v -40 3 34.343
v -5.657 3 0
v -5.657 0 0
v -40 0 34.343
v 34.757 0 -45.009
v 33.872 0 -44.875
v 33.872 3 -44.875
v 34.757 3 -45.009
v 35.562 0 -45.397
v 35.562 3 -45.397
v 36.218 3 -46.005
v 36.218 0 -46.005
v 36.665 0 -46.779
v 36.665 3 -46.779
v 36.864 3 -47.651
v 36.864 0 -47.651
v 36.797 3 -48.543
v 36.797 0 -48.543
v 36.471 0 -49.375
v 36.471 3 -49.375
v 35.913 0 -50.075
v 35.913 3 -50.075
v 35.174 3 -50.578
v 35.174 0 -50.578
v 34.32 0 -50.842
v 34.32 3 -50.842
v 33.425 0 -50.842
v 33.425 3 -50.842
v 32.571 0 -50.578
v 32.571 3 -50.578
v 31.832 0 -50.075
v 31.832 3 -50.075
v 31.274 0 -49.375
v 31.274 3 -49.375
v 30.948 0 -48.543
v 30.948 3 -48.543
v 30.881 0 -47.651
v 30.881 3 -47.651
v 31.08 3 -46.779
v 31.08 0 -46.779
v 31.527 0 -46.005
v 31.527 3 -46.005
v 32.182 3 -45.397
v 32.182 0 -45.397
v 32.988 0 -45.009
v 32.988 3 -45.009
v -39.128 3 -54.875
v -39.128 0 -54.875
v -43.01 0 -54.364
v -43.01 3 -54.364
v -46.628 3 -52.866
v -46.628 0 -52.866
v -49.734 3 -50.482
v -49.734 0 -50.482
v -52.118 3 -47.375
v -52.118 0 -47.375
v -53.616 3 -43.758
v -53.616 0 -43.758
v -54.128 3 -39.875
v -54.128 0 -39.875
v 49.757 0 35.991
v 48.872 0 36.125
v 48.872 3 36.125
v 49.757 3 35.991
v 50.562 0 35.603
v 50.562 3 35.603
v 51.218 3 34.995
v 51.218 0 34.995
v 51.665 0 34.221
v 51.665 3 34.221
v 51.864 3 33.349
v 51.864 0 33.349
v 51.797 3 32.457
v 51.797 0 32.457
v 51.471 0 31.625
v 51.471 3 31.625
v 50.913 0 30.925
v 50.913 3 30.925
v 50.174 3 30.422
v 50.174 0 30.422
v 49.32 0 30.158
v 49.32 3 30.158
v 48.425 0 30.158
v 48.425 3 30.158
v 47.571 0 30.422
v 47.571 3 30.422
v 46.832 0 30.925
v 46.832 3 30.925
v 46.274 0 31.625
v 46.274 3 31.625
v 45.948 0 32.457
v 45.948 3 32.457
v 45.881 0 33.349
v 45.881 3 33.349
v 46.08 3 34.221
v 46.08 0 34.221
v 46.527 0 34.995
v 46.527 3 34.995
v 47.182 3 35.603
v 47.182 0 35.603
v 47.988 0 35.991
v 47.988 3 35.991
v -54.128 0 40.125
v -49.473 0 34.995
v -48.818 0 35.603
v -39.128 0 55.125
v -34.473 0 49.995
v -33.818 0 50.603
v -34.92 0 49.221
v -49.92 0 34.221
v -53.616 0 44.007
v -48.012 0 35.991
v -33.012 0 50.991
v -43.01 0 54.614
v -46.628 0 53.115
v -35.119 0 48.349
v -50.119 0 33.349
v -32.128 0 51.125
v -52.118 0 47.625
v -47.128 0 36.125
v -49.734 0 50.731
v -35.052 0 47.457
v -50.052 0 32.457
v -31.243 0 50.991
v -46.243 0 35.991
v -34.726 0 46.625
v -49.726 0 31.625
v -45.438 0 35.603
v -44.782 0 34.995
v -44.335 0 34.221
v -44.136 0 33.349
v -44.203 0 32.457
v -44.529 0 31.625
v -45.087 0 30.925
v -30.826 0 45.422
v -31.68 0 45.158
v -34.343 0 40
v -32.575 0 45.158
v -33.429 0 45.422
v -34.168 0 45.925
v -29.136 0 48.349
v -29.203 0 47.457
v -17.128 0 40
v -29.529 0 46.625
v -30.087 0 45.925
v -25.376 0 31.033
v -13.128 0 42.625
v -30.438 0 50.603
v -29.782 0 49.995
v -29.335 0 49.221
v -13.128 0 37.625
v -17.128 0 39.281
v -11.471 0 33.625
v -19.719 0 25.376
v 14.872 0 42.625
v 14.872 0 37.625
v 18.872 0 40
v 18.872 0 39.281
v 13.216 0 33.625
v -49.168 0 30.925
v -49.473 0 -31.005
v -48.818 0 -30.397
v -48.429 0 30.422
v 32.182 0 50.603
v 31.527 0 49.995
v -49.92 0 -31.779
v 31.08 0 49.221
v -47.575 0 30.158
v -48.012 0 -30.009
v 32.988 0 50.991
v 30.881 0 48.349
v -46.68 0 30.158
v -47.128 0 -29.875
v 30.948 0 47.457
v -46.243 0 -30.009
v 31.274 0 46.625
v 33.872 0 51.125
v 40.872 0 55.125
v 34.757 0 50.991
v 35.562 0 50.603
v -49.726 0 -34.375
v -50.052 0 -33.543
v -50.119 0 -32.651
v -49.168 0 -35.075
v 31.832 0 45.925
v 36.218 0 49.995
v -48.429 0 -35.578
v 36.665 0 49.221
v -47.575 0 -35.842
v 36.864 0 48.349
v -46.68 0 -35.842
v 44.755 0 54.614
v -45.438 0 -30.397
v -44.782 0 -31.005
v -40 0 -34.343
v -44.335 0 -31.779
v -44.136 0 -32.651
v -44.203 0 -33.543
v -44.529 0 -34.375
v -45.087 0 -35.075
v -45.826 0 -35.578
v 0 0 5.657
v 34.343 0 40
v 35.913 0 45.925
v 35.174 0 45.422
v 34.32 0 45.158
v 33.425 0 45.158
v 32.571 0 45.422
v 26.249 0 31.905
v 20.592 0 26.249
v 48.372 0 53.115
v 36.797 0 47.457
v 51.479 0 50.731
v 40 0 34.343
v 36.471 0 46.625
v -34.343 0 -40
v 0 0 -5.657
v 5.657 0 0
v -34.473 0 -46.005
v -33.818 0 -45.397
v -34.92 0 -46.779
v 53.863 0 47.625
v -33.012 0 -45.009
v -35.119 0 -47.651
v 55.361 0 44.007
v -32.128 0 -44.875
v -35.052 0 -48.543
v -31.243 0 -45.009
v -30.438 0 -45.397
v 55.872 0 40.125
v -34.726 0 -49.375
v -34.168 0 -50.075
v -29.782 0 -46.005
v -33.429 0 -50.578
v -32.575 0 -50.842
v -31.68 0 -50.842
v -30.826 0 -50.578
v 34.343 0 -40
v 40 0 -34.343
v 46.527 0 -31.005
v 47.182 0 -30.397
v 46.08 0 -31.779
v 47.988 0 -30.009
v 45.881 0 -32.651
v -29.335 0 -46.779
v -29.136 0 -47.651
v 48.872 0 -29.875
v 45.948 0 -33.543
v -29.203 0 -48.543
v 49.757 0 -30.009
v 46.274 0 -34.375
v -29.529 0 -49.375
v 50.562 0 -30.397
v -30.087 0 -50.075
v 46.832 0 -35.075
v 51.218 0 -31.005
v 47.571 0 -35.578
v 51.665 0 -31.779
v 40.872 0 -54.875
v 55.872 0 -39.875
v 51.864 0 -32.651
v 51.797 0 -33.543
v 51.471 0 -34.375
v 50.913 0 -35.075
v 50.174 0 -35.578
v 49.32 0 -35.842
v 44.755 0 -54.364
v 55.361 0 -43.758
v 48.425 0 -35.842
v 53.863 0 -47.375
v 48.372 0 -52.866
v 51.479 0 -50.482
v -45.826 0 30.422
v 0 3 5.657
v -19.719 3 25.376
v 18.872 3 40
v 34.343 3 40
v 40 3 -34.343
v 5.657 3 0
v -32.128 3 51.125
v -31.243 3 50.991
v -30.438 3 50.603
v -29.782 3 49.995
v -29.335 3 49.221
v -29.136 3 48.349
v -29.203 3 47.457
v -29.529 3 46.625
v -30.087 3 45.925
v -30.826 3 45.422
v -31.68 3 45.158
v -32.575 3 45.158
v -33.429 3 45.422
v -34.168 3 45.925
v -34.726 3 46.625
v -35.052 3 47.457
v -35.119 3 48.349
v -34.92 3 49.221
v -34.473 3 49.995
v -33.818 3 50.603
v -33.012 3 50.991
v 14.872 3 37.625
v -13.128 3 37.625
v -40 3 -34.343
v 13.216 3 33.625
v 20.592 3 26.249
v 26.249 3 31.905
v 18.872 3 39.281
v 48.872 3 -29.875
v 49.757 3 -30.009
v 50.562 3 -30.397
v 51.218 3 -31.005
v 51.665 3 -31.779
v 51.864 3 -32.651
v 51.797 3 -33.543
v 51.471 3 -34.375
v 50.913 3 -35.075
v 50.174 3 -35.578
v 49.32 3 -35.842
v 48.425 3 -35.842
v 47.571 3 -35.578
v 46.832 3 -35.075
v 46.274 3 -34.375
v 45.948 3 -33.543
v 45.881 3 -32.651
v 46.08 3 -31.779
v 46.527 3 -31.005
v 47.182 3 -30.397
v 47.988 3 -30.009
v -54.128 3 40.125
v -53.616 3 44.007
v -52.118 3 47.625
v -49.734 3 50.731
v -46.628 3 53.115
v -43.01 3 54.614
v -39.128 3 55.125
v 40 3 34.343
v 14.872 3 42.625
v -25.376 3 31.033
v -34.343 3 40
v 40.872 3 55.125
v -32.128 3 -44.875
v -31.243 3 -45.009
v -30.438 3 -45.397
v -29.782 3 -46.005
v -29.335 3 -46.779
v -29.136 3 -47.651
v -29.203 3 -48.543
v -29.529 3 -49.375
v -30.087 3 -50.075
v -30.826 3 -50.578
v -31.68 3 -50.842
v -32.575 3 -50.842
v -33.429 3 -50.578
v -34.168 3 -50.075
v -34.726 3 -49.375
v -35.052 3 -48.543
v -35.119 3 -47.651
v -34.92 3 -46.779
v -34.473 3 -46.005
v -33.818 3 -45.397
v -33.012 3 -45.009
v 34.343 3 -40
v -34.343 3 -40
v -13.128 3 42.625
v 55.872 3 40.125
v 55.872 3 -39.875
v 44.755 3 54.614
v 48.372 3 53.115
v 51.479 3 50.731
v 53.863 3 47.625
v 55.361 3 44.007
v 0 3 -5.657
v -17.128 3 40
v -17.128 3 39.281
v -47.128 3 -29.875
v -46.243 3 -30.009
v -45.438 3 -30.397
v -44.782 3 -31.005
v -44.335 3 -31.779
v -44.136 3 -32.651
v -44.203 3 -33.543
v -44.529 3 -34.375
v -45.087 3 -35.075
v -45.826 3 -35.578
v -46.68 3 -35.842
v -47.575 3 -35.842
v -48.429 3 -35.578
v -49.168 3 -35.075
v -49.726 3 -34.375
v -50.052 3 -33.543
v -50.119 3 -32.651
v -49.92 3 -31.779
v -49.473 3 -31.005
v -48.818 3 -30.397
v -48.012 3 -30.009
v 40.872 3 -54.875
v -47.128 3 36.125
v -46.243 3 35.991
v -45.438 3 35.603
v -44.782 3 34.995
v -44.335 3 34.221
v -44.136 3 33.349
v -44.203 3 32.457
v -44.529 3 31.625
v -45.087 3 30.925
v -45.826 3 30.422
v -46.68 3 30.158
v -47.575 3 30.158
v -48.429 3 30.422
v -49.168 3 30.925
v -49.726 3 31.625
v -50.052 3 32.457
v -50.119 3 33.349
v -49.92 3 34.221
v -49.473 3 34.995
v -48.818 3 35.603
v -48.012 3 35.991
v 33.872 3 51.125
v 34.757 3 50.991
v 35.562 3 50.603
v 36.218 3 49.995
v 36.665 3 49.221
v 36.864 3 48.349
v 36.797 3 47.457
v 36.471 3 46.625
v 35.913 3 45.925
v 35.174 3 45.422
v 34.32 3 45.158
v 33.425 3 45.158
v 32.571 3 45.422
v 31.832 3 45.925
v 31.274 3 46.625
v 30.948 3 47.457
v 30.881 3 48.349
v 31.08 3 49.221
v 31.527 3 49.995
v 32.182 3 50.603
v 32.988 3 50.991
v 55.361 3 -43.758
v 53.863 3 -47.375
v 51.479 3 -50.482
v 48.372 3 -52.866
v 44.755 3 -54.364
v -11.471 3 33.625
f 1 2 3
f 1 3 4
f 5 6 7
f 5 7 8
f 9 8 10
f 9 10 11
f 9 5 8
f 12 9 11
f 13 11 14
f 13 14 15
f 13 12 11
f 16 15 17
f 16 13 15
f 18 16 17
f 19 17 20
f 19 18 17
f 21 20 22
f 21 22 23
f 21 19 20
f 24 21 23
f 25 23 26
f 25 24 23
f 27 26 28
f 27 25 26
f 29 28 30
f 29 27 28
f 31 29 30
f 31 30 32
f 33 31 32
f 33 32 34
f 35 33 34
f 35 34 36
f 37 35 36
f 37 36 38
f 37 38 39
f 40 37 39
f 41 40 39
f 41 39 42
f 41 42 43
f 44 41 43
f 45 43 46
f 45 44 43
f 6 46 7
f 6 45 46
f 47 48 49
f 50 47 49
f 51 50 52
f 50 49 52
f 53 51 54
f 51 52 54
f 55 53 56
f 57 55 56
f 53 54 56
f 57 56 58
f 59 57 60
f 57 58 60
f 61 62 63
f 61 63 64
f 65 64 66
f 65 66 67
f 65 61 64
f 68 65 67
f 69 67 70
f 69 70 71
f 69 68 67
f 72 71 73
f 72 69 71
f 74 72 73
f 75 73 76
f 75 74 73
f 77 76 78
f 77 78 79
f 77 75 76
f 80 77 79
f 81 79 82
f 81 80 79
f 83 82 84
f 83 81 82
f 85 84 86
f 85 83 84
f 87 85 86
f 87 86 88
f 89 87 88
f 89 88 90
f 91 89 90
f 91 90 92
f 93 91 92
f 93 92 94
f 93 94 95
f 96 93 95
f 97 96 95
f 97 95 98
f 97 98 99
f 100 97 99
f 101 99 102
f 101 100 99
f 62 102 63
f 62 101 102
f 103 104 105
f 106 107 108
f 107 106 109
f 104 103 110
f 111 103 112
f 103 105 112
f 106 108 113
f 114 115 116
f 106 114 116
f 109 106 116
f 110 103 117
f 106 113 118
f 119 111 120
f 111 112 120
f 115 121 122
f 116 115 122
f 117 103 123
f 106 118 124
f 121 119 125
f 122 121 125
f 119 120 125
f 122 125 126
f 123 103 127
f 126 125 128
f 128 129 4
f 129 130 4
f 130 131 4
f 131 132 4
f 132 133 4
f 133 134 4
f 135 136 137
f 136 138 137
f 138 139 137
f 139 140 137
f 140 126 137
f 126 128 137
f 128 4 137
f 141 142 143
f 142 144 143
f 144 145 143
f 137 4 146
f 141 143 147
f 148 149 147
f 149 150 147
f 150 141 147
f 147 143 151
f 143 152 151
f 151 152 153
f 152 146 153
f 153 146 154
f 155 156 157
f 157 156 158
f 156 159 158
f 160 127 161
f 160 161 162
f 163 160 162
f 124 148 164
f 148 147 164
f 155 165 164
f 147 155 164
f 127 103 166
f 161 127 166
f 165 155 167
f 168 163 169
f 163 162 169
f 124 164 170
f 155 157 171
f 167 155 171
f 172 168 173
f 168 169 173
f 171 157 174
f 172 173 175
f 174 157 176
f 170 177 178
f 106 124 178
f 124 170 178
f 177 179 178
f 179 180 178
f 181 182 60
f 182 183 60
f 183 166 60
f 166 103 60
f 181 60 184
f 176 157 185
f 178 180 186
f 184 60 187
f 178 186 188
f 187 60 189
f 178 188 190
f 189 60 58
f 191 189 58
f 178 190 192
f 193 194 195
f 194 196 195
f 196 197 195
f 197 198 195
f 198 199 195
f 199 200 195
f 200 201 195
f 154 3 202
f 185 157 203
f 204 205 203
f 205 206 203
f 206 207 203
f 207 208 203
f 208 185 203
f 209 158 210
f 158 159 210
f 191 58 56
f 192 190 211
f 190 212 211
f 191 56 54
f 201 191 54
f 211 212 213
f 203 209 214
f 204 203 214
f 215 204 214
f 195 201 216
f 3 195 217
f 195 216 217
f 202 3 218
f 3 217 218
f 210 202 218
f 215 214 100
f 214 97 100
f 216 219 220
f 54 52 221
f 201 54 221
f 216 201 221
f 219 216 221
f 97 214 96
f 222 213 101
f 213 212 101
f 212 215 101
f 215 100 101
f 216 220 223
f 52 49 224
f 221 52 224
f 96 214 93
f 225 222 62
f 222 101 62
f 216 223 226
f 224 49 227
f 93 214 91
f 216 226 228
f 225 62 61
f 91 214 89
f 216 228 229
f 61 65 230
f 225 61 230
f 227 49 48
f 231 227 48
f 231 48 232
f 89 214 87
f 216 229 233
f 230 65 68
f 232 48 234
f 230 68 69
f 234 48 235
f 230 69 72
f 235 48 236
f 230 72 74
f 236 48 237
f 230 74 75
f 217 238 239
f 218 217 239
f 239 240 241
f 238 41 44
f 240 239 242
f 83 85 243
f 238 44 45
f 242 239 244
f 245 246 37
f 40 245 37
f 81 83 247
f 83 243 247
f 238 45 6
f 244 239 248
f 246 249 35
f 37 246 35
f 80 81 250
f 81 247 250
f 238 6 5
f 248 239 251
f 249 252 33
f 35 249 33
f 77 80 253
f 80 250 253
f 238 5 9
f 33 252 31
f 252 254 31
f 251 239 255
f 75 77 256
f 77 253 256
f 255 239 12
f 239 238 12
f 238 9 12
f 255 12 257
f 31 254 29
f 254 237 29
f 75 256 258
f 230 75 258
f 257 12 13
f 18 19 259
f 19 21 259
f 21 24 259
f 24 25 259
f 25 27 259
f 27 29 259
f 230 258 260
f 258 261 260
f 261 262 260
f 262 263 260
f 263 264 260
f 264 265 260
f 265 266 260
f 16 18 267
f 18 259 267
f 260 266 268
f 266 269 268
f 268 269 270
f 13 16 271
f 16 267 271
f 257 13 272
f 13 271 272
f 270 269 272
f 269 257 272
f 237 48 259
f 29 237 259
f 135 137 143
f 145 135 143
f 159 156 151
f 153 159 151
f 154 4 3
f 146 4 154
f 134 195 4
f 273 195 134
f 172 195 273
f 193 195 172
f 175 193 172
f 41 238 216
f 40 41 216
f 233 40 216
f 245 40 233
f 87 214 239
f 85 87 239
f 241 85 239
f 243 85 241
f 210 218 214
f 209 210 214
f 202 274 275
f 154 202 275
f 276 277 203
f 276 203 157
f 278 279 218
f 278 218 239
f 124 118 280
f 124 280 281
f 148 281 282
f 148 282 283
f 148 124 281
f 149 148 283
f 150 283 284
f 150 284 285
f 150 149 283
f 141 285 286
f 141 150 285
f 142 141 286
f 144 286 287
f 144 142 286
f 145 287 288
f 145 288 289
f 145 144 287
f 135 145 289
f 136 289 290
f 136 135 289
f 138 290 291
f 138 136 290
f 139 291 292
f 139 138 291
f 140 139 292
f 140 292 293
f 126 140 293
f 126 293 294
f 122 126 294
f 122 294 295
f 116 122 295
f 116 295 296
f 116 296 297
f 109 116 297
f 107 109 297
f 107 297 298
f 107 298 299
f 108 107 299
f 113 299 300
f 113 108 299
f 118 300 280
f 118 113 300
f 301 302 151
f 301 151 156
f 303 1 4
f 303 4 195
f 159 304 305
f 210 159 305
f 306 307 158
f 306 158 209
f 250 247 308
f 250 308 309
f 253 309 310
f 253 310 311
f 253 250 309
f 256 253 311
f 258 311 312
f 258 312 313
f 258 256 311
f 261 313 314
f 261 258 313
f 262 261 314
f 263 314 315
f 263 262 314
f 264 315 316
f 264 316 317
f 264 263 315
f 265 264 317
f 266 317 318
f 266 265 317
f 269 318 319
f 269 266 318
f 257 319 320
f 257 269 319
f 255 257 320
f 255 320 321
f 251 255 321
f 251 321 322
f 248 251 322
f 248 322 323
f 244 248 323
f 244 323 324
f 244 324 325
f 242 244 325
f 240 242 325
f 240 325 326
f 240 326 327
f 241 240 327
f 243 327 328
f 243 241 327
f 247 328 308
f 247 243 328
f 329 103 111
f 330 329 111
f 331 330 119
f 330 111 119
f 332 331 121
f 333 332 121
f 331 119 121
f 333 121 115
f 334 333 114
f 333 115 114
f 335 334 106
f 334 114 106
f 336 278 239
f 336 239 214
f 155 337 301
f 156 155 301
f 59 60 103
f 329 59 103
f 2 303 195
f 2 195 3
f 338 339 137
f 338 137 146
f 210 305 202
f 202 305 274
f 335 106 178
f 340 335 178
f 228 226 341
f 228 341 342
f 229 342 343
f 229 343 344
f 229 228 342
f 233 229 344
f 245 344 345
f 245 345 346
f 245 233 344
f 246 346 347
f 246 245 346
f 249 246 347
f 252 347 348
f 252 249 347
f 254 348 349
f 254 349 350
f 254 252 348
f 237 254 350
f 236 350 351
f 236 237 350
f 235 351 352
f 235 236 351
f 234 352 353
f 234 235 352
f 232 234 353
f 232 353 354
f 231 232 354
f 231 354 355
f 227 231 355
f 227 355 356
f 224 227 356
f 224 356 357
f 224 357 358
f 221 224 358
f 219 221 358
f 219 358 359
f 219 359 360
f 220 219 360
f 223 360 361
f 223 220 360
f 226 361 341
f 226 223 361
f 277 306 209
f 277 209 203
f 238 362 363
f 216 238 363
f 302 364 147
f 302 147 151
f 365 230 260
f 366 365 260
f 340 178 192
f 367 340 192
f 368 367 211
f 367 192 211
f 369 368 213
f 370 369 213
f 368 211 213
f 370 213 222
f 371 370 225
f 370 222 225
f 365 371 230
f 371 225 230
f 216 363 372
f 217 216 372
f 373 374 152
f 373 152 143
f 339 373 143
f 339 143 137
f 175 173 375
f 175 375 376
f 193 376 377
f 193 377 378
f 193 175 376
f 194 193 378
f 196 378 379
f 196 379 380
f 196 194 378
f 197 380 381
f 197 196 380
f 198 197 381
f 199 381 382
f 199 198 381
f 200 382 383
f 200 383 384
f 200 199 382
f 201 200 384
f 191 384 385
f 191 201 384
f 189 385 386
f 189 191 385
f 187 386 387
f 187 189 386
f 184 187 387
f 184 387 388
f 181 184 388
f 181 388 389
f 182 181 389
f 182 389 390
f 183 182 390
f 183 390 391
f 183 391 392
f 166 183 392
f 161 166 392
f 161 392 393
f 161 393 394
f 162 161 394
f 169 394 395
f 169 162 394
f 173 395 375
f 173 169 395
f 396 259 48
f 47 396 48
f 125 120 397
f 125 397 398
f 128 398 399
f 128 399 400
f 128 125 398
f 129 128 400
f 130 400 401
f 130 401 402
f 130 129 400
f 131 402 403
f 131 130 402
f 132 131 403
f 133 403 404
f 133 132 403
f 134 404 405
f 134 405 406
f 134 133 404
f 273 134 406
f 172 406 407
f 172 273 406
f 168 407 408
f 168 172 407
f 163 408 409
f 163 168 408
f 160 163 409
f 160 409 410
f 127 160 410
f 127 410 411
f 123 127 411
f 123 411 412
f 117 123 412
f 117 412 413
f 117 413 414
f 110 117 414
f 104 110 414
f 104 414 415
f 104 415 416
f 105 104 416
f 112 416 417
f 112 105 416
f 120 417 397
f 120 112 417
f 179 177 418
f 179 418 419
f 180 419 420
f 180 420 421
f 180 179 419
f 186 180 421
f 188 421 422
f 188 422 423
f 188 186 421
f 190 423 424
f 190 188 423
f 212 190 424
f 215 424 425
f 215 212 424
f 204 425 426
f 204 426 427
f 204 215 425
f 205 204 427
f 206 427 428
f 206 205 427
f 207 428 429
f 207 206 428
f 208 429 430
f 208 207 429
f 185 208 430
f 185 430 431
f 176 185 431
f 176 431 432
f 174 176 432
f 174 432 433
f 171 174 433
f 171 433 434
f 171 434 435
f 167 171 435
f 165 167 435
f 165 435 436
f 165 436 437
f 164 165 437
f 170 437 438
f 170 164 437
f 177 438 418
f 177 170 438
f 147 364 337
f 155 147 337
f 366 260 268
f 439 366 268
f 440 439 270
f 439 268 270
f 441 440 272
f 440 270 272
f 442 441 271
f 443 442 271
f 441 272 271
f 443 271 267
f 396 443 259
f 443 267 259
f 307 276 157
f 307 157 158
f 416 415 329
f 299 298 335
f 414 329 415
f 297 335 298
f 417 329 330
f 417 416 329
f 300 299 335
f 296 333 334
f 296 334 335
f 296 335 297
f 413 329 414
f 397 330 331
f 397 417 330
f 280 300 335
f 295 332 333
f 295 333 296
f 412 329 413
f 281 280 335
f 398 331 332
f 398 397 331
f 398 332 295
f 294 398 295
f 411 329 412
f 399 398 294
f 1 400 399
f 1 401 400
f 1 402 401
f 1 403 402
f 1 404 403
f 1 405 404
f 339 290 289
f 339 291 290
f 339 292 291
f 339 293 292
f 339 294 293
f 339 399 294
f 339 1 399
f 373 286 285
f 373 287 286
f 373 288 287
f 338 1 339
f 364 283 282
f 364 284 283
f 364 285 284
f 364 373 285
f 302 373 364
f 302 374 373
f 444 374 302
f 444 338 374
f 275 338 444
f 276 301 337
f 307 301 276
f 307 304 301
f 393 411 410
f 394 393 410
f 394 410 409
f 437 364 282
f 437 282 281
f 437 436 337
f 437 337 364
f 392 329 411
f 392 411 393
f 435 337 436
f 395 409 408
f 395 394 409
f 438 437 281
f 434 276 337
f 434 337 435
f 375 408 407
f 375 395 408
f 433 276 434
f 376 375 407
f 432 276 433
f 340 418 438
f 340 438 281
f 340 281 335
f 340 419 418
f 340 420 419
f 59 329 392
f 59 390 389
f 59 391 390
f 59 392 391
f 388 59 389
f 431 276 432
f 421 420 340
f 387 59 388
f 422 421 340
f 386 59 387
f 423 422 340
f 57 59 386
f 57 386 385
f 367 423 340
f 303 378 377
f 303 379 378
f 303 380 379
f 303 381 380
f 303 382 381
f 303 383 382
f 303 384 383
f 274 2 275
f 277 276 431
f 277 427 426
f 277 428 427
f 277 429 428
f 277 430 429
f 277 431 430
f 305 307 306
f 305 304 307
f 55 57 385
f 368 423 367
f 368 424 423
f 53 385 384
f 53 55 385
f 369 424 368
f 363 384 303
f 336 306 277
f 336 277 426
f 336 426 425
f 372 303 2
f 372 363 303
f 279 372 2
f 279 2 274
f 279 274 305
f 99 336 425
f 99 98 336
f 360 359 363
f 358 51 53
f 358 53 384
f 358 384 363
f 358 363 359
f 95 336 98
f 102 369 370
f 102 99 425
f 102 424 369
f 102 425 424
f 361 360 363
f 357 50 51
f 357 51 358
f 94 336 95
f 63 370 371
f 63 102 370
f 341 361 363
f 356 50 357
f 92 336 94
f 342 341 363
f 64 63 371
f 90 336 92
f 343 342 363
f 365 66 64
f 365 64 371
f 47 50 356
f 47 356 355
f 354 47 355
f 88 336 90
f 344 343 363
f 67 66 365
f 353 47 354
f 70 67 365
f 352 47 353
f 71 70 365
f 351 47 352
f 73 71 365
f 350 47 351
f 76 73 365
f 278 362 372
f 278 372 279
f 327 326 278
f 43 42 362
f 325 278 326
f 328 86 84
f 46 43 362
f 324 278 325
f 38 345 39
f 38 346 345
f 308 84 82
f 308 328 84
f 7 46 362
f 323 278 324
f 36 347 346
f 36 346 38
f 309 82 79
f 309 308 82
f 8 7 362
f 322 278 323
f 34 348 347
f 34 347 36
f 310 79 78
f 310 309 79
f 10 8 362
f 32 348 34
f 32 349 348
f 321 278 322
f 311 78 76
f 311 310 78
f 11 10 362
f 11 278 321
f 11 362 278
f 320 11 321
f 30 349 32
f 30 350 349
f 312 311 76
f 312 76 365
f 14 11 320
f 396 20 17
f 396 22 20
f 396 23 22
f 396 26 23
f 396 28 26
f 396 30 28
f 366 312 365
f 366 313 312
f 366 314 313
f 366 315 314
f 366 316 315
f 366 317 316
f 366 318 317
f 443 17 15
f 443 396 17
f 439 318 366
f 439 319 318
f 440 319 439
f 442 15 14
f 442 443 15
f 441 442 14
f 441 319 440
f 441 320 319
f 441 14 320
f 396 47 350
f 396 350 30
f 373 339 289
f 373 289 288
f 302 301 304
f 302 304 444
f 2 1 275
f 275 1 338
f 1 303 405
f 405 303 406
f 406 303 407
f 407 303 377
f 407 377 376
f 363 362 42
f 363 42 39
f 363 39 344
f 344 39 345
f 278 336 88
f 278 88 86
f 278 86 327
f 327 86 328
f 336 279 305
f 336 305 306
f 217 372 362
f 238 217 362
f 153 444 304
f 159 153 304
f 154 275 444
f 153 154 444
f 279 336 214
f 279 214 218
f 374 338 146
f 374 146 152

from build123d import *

# Parameters (mm, degrees)
SKETCH1_R           = 3
BOSS_EXTRUDE1_DEPTH = 3
SKETCH2_W           = 28
SKETCH2_H           = 5
CUT_EXTRUDE1_DEPTH  = 79.545892535
CUT_EXTRUDE2_DEPTH  = 79.545892535


with BuildPart() as part:
    # Sketch1 → Boss-Extrude1 (new body)
    with BuildSketch(Plane(origin=(0, 0, 0), x_dir=(1, 0, 0), z_dir=(0, 1, 0))):
        with BuildLine():
            Line((55.872458647, -40.12463695), (55.872458647, 39.87536305))
            ThreePointArc((55.872458647, 39.87536305), (51.479060365, 50.481964768), (40.872458647, 54.87536305))
            Line((40.872458647, 54.87536305), (-39.127541353, 54.87536305))
            ThreePointArc((-39.127541353, 54.87536305), (-49.734143071, 50.481964768), (-54.127541353, 39.87536305))
            Line((-54.127541353, 39.87536305), (-54.127541353, -40.12463695))
            ThreePointArc((-54.127541353, -40.12463695), (-49.734143071, -50.731238667), (-39.127541353, -55.12463695))
            Line((-39.127541353, -55.12463695), (40.872458647, -55.12463695))
            ThreePointArc((40.872458647, -55.12463695), (51.479060365, -50.731238667), (55.872458647, -40.12463695))
        make_face()
        with Locations(Location((48.872458647, 32.87536305, 0), (0, 0, 270))):
            Circle(SKETCH1_R, mode=Mode.SUBTRACT)
        with Locations(Location((-47.127541353, -33.12463695, 0), (0, 0, 270))):
            Circle(SKETCH1_R, mode=Mode.SUBTRACT)
        with Locations(Location((-32.127541353, -48.12463695, 0), (0, 0, 270))):
            Circle(SKETCH1_R, mode=Mode.SUBTRACT)
        with Locations(Location((33.872458647, -48.12463695, 0), (0, 0, 270))):
            Circle(SKETCH1_R, mode=Mode.SUBTRACT)
        with Locations(Location((48.872458647, -33.12463695, 0), (0, 0, 270))):
            Circle(SKETCH1_R, mode=Mode.SUBTRACT)
        with Locations(Location((33.872458647, 47.87536305, 0), (0, 0, 270))):
            Circle(SKETCH1_R, mode=Mode.SUBTRACT)
        with Locations(Location((-32.127541353, 47.87536305, 0), (0, 0, 270))):
            Circle(SKETCH1_R, mode=Mode.SUBTRACT)
        with Locations(Location((-47.127541353, 32.87536305, 0), (0, 0, 270))):
            Circle(SKETCH1_R, mode=Mode.SUBTRACT)
    extrude(amount=BOSS_EXTRUDE1_DEPTH)

    # Sketch2 → Cut-Extrude1 (cut, through all)
    with BuildSketch(Plane(origin=(0, 3, 0), x_dir=(1, 0, 0), z_dir=(0, 1, 0))):
        with Locations((0.872458647, -40.12463695)):
            Rectangle(SKETCH2_W, SKETCH2_H)
    extrude(amount=-CUT_EXTRUDE1_DEPTH, mode=Mode.SUBTRACT)

    # Sketch3 → Cut-Extrude2 (cut, through all)
    with BuildSketch(Plane(origin=(0, 3, 0), x_dir=(1, 0, 0), z_dir=(0, 1, 0))):
        Polygon((40, -34.343145751), (5.656854249, 0), (40, 34.343145751), align=None)
        Polygon((34.343145751, -40), (18.872458647, -40), (18.872458647, -39.281491199), (26.248547798, -31.905402048), align=None)
        Polygon((34.343145751, 40), (-34.343145751, 40), (0, 5.656854249), align=None)
        Polygon((-40, -34.343145751), (-40, 34.343145751), (-5.656854249, 0), align=None)
        Polygon((0, -5.656854249), (-19.719234902, -25.376089151), (-11.470687104, -33.62463695), (13.215604397, -33.62463695), (20.591693549, -26.248547798), align=None)
        Polygon((-17.127541353, -39.281491199), (-17.127541353, -40), (-34.343145751, -40), (-25.376089151, -31.032943401), align=None)
    extrude(amount=-CUT_EXTRUDE2_DEPTH, mode=Mode.SUBTRACT)


solid = part.part
